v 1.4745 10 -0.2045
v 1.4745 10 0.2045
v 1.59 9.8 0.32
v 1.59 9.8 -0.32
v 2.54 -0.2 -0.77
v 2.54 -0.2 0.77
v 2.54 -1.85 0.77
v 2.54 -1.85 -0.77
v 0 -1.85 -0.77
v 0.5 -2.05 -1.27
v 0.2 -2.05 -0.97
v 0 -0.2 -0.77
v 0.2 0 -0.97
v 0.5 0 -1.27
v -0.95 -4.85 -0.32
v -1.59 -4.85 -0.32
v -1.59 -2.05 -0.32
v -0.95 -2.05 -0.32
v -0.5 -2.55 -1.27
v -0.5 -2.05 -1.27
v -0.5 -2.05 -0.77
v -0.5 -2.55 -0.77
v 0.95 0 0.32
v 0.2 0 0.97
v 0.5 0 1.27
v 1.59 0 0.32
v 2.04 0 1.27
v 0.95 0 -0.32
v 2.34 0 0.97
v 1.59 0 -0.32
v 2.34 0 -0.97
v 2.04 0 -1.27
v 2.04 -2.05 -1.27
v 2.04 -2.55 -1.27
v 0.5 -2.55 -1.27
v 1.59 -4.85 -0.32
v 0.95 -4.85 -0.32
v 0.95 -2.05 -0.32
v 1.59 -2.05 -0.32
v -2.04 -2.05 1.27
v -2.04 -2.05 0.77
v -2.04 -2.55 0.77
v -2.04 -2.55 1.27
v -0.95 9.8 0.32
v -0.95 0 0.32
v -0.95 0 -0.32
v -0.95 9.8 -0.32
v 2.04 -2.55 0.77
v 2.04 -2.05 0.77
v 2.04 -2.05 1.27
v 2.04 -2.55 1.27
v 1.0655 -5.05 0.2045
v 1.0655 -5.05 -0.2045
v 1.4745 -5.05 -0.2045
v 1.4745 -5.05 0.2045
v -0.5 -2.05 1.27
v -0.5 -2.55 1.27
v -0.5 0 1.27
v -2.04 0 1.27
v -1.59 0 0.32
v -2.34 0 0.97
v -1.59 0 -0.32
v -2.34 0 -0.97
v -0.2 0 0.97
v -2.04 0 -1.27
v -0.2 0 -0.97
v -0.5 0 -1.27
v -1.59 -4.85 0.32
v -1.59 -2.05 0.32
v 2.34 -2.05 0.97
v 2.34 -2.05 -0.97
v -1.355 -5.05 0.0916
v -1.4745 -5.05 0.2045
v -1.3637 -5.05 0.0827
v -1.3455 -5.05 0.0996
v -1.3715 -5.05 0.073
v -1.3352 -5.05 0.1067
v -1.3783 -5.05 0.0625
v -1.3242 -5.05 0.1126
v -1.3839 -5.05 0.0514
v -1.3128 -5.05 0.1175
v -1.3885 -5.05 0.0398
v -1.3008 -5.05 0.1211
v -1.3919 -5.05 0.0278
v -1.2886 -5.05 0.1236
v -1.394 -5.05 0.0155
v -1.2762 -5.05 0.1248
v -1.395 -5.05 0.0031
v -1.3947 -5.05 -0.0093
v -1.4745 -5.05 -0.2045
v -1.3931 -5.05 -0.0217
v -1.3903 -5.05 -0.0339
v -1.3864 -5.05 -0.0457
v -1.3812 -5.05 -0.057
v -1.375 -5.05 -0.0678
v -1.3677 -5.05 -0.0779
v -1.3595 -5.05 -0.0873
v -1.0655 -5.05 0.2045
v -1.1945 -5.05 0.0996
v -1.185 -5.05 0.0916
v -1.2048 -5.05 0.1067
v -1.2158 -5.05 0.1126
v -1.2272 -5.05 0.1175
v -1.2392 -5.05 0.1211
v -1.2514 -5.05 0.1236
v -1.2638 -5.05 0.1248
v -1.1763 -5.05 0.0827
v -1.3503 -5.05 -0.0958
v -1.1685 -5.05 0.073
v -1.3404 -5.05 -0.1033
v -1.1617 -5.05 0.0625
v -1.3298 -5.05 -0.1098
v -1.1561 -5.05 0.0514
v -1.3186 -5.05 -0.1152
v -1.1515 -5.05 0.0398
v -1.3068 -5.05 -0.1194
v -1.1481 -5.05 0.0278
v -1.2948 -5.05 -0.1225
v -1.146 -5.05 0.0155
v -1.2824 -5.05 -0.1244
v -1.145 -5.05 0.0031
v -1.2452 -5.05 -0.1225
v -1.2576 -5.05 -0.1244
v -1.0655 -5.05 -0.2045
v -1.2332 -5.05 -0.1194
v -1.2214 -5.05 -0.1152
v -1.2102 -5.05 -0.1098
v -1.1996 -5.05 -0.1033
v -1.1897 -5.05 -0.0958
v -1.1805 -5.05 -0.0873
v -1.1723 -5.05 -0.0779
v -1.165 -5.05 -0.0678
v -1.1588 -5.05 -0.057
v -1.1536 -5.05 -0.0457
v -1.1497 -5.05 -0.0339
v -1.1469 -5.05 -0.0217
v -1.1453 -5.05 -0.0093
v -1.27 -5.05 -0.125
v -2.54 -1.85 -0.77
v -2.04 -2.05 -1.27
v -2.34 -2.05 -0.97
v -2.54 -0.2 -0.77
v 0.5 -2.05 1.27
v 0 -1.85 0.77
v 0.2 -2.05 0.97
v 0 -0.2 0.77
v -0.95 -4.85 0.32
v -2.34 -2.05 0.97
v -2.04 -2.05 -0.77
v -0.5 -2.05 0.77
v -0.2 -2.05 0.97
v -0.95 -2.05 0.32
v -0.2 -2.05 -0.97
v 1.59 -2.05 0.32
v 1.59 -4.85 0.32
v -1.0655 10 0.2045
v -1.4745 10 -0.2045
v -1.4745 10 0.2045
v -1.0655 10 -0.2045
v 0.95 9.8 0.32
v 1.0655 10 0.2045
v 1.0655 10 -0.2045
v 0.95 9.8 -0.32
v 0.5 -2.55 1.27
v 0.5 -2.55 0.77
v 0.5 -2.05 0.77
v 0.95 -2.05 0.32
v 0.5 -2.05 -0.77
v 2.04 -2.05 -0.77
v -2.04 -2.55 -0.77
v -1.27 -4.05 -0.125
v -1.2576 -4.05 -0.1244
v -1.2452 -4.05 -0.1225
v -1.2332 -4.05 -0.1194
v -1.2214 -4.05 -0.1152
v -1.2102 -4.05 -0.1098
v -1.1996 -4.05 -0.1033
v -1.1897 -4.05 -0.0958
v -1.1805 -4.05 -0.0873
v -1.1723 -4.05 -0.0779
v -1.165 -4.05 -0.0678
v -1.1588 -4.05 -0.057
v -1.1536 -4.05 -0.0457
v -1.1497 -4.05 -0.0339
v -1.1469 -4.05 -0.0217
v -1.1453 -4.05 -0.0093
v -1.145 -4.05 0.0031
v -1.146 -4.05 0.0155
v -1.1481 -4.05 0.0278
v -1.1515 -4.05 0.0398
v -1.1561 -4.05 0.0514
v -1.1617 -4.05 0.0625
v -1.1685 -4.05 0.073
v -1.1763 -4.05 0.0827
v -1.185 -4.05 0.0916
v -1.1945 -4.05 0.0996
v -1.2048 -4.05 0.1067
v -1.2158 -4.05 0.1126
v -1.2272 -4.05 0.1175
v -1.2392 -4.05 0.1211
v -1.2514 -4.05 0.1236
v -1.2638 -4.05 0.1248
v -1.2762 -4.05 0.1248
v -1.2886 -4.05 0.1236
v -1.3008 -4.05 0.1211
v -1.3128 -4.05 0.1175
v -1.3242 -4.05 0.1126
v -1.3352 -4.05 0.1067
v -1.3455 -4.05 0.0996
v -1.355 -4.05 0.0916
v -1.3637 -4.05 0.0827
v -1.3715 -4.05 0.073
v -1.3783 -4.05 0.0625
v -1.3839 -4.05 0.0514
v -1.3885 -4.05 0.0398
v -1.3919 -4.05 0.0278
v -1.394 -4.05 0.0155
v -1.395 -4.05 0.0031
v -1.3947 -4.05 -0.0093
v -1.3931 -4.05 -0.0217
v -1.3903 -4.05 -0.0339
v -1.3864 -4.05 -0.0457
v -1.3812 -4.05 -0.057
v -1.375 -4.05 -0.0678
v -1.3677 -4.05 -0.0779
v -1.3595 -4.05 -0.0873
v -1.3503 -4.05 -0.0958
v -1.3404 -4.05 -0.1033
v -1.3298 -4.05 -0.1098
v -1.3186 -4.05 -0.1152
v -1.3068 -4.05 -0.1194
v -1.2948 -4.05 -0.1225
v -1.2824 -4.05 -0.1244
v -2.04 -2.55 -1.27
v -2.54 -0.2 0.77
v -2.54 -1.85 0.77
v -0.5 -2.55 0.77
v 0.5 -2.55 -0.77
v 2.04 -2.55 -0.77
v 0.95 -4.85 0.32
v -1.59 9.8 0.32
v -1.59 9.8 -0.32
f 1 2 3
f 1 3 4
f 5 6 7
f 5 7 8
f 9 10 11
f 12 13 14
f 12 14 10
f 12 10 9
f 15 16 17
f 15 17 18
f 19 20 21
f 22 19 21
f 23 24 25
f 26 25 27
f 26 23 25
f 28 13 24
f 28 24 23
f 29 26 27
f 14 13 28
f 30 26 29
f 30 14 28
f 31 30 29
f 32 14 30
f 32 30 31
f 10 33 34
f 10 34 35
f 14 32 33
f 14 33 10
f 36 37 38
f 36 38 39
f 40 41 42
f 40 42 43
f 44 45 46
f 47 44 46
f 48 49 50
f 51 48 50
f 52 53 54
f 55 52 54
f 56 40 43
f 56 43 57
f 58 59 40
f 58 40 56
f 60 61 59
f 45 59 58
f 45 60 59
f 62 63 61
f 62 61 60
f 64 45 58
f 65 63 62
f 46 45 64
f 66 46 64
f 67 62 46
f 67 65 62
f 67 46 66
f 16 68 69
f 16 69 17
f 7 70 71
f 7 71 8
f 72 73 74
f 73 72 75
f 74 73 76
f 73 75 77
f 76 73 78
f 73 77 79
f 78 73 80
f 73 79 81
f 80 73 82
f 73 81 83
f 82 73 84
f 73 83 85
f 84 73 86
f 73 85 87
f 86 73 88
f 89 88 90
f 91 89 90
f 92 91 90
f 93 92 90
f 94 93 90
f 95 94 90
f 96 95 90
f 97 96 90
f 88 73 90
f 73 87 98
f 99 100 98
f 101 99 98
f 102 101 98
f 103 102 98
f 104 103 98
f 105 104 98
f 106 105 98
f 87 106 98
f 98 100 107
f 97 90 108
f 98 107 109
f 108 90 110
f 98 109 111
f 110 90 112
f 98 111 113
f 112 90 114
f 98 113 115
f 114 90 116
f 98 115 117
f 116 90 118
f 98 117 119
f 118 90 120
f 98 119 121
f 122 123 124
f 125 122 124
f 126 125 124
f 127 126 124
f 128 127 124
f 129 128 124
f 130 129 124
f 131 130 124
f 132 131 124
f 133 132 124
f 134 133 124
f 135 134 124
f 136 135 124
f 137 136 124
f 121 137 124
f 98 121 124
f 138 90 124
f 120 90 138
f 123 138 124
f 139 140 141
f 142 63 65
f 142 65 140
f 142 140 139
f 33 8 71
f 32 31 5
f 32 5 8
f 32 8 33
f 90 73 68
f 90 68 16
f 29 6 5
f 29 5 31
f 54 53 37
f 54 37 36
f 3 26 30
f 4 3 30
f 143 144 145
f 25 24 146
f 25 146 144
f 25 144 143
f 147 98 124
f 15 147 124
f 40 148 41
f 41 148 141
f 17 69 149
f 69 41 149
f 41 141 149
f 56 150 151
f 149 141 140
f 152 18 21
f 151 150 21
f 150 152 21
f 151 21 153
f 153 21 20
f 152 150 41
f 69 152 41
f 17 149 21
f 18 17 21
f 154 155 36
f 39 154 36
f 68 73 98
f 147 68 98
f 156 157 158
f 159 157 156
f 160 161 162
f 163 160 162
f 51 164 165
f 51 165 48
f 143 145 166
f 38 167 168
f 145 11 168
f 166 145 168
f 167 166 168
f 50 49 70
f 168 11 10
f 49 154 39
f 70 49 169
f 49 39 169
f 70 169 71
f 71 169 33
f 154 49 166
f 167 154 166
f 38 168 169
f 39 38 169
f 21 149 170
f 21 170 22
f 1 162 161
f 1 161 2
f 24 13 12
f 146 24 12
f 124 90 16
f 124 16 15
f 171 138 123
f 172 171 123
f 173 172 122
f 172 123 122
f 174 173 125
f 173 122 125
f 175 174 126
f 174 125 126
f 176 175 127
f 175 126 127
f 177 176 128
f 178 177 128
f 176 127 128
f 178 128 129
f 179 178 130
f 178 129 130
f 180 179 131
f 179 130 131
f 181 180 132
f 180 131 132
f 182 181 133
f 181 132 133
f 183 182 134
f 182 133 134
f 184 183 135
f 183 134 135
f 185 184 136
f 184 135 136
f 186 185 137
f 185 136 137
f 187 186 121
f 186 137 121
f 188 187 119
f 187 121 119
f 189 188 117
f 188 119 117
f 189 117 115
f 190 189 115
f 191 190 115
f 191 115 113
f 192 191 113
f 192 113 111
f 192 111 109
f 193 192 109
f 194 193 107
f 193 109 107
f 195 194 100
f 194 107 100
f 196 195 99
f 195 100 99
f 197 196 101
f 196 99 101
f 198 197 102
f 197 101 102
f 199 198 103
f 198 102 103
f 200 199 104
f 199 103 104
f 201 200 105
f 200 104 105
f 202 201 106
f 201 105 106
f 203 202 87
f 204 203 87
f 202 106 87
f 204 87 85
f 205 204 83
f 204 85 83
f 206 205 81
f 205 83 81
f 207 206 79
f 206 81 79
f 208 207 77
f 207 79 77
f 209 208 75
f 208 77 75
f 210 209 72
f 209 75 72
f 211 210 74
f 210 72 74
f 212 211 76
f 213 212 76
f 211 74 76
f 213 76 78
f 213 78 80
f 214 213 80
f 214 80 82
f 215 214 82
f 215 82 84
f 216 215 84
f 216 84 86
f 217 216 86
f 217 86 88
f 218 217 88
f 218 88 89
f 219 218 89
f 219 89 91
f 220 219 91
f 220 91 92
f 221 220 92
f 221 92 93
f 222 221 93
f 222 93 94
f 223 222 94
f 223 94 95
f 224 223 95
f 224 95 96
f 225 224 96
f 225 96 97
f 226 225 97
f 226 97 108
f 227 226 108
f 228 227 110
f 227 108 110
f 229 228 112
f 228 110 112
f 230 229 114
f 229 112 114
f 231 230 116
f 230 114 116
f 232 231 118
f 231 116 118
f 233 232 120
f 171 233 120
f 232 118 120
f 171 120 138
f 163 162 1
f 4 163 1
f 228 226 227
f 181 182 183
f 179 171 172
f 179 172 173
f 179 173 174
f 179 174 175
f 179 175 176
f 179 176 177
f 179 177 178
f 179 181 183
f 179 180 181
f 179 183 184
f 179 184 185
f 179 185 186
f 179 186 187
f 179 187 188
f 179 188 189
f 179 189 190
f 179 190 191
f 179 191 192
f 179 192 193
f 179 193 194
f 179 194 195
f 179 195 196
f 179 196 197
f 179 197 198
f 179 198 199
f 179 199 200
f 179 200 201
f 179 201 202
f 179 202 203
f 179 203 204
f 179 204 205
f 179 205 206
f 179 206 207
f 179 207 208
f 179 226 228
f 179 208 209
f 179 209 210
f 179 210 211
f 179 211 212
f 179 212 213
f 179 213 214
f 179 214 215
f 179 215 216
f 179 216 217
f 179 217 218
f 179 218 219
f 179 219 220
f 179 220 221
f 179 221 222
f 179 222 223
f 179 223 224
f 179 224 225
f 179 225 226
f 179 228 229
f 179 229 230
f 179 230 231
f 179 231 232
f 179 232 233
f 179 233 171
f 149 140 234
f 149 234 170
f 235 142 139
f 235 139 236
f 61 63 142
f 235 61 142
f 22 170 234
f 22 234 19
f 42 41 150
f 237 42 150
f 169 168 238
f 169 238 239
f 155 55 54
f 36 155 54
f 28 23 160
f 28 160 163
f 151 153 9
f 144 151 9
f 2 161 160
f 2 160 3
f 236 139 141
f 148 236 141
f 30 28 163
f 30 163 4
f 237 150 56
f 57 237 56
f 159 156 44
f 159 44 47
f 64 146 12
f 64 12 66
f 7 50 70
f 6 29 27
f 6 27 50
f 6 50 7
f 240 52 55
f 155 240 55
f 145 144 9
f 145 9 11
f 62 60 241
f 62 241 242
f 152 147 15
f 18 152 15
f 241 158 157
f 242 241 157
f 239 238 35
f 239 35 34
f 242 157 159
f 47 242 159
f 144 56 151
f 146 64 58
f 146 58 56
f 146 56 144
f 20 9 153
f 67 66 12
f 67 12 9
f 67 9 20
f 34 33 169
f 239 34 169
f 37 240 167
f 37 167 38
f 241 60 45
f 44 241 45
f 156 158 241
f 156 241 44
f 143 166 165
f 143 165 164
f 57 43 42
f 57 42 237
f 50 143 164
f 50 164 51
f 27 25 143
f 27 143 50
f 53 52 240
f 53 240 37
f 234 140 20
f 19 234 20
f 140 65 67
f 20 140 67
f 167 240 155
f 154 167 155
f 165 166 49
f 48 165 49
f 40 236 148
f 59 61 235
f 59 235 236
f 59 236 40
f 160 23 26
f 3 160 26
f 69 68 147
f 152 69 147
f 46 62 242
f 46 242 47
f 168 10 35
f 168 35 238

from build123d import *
from OCP.BRepFilletAPI import BRepFilletAPI_MakeChamfer

# Parameters (mm, degrees)
SKETCH1_W                = 0.64
SKETCH1_H                = 0.64
BOSS_EXTRUDE1_DEPTH      = 2.05
CUT_EXTRUDE1_DEPTH       = 5
SKETCH3_W                = 1.54
SKETCH3_H                = 0.5
BOSS_EXTRUDE2_DEPTH      = 0.5
BOSS_EXTRUDE3_DEPTH      = 10
BOSS_EXTRUDE3_DEPTH_BACK = 5.05
SKETCH4_W                = 0.64
SKETCH4_H                = 0.64
CHAMFER1_SIZE            = 0.2
CHAMFER1_SIZE2           = 0.115470054
SKETCH5_R                = 0.125
CUT_EXTRUDE2_DEPTH       = 1


with BuildPart() as part:
    # Sketch1 → Boss-Extrude1 (new body)
    with BuildSketch(Plane(origin=(0, 0, 0), x_dir=(1, 0, 0), z_dir=(0, 1, 0))):
        Polygon((-2.04, -1.27), (-0.5, -1.27), (0, -0.77), (0.5, -1.27), (2.04, -1.27), (2.54, -0.77), (2.54, 0.77), (2.04, 1.27), (0.5, 1.27), (0, 0.77), (-0.5, 1.27), (-2.04, 1.27), (-2.54, 0.77), (-2.54, -0.77), align=None)
        with Locations((1.27, 0)):
            Rectangle(SKETCH1_W, SKETCH1_H, mode=Mode.SUBTRACT)
        with Locations((-1.27, 0)):
            Rectangle(SKETCH1_W, SKETCH1_H, mode=Mode.SUBTRACT)
    extrude(amount=-BOSS_EXTRUDE1_DEPTH)

    # Sketch2 → Cut-Extrude1 (cut, symmetric)
    with BuildSketch(Plane.XY):
        Polygon((-2.54, -0.2), (-2.54, 0), (-2.34, 0), align=None)
        Polygon((-0.2, 0), (0.2, 0), (0, -0.2), align=None)
        Polygon((2.34, 0), (2.54, 0), (2.54, -0.2), align=None)
        Polygon((-2.54, -1.85), (-2.34, -2.05), (-2.54, -2.05), align=None)
        Polygon((-0.2, -2.05), (0, -1.85), (0.2, -2.05), align=None)
        Polygon((2.34, -2.05), (2.54, -1.85), (2.54, -2.05), align=None)
    extrude(amount=CUT_EXTRUDE1_DEPTH, both=True, mode=Mode.SUBTRACT)

    # Sketch3 → Boss-Extrude2 (add)
    with BuildSketch(Plane.XZ.offset(2.05)):
        with Locations((-1.27, -1.02)):
            Rectangle(SKETCH3_W, SKETCH3_H)
        with Locations((-1.27, 1.02)):
            Rectangle(SKETCH3_W, SKETCH3_H)
        with Locations((1.27, 1.02)):
            Rectangle(SKETCH3_W, SKETCH3_H)
        with Locations((1.27, -1.02)):
            Rectangle(SKETCH3_W, SKETCH3_H)
    extrude(amount=BOSS_EXTRUDE2_DEPTH)

    # Sketch4 → Boss-Extrude3 (add, two sides: drawn at the far end of the back side and taken through both)
    with BuildSketch(Plane(origin=(0, 0, 0), x_dir=(1, 0, 0), z_dir=(0, 1, 0)).offset(-BOSS_EXTRUDE3_DEPTH_BACK)):
        with Locations((-1.27, 0)):
            Rectangle(SKETCH4_W, SKETCH4_H)
        with Locations((1.27, 0)):
            Rectangle(SKETCH4_W, SKETCH4_H)
    extrude(amount=BOSS_EXTRUDE3_DEPTH + BOSS_EXTRUDE3_DEPTH_BACK)

    # Chamfer1: one chamfer whose edges measure the first distance from different faces: ONE call of the kernel's chamfer builder (chamfer() names one face for all edges)
    chamfer1_edges_1 = [part.edges().sort_by_distance(p)[0] for p in [
        (-1.59, -5.05, 0),
    ]]
    chamfer1_side_1 = [part.faces().sort_by_distance(p)[0] for p in [
        (-1.59, -3.55, 0),
    ]]
    chamfer1_edges_2 = [part.edges().sort_by_distance(p)[0] for p in [
        (-1.27, -5.05, -0.32),
    ]]
    chamfer1_side_2 = [part.faces().sort_by_distance(p)[0] for p in [
        (-1.27, -3.55, -0.32),
    ]]
    chamfer1_edges_3 = [part.edges().sort_by_distance(p)[0] for p in [
        (-0.95, -5.05, 0),
    ]]
    chamfer1_side_3 = [part.faces().sort_by_distance(p)[0] for p in [
        (-0.95, -3.55, 0),
    ]]
    chamfer1_edges_4 = [part.edges().sort_by_distance(p)[0] for p in [
        (-1.27, -5.05, 0.32),
    ]]
    chamfer1_side_4 = [part.faces().sort_by_distance(p)[0] for p in [
        (-1.27, -3.55, 0.32),
    ]]
    chamfer1_edges_5 = [part.edges().sort_by_distance(p)[0] for p in [
        (-1.59, 10, 0),
    ]]
    chamfer1_side_5 = [part.faces().sort_by_distance(p)[0] for p in [
        (-1.59, 5, 0),
    ]]
    chamfer1_edges_6 = [part.edges().sort_by_distance(p)[0] for p in [
        (-1.27, 10, 0.32),
    ]]
    chamfer1_side_6 = [part.faces().sort_by_distance(p)[0] for p in [
        (-1.27, 5, 0.32),
    ]]
    chamfer1_edges_7 = [part.edges().sort_by_distance(p)[0] for p in [
        (-0.95, 10, 0),
    ]]
    chamfer1_side_7 = [part.faces().sort_by_distance(p)[0] for p in [
        (-0.95, 5, 0),
    ]]
    chamfer1_edges_8 = [part.edges().sort_by_distance(p)[0] for p in [
        (-1.27, 10, -0.32),
    ]]
    chamfer1_side_8 = [part.faces().sort_by_distance(p)[0] for p in [
        (-1.27, 5, -0.32),
    ]]
    chamfer1_edges_9 = [part.edges().sort_by_distance(p)[0] for p in [
        (0.95, -5.05, 0),
    ]]
    chamfer1_side_9 = [part.faces().sort_by_distance(p)[0] for p in [
        (0.95, -3.55, 0),
    ]]
    chamfer1_edges_10 = [part.edges().sort_by_distance(p)[0] for p in [
        (1.27, -5.05, -0.32),
    ]]
    chamfer1_side_10 = [part.faces().sort_by_distance(p)[0] for p in [
        (1.27, -3.55, -0.32),
    ]]
    chamfer1_edges_11 = [part.edges().sort_by_distance(p)[0] for p in [
        (1.59, -5.05, 0),
    ]]
    chamfer1_side_11 = [part.faces().sort_by_distance(p)[0] for p in [
        (1.59, -3.55, 0),
    ]]
    chamfer1_edges_12 = [part.edges().sort_by_distance(p)[0] for p in [
        (1.27, -5.05, 0.32),
    ]]
    chamfer1_side_12 = [part.faces().sort_by_distance(p)[0] for p in [
        (1.27, -3.55, 0.32),
    ]]
    chamfer1_edges_13 = [part.edges().sort_by_distance(p)[0] for p in [
        (0.95, 10, 0),
    ]]
    chamfer1_side_13 = [part.faces().sort_by_distance(p)[0] for p in [
        (0.95, 5, 0),
    ]]
    chamfer1_edges_14 = [part.edges().sort_by_distance(p)[0] for p in [
        (1.27, 10, 0.32),
    ]]
    chamfer1_side_14 = [part.faces().sort_by_distance(p)[0] for p in [
        (1.27, 5, 0.32),
    ]]
    chamfer1_edges_15 = [part.edges().sort_by_distance(p)[0] for p in [
        (1.59, 10, 0),
    ]]
    chamfer1_side_15 = [part.faces().sort_by_distance(p)[0] for p in [
        (1.59, 5, 0),
    ]]
    chamfer1_edges_16 = [part.edges().sort_by_distance(p)[0] for p in [
        (1.27, 10, -0.32),
    ]]
    chamfer1_side_16 = [part.faces().sort_by_distance(p)[0] for p in [
        (1.27, 5, -0.32),
    ]]
    chamfer1 = BRepFilletAPI_MakeChamfer(part.part.solid().wrapped)
    for e in chamfer1_edges_1:
        chamfer1.Add(CHAMFER1_SIZE, CHAMFER1_SIZE2, e.wrapped, chamfer1_side_1[0].wrapped)  # the first distance lies on this face
    for e in chamfer1_edges_2:
        chamfer1.Add(CHAMFER1_SIZE, CHAMFER1_SIZE2, e.wrapped, chamfer1_side_2[0].wrapped)  # the first distance lies on this face
    for e in chamfer1_edges_3:
        chamfer1.Add(CHAMFER1_SIZE, CHAMFER1_SIZE2, e.wrapped, chamfer1_side_3[0].wrapped)  # the first distance lies on this face
    for e in chamfer1_edges_4:
        chamfer1.Add(CHAMFER1_SIZE, CHAMFER1_SIZE2, e.wrapped, chamfer1_side_4[0].wrapped)  # the first distance lies on this face
    for e in chamfer1_edges_5:
        chamfer1.Add(CHAMFER1_SIZE, CHAMFER1_SIZE2, e.wrapped, chamfer1_side_5[0].wrapped)  # the first distance lies on this face
    for e in chamfer1_edges_6:
        chamfer1.Add(CHAMFER1_SIZE, CHAMFER1_SIZE2, e.wrapped, chamfer1_side_6[0].wrapped)  # the first distance lies on this face
    for e in chamfer1_edges_7:
        chamfer1.Add(CHAMFER1_SIZE, CHAMFER1_SIZE2, e.wrapped, chamfer1_side_7[0].wrapped)  # the first distance lies on this face
    for e in chamfer1_edges_8:
        chamfer1.Add(CHAMFER1_SIZE, CHAMFER1_SIZE2, e.wrapped, chamfer1_side_8[0].wrapped)  # the first distance lies on this face
    for e in chamfer1_edges_9:
        chamfer1.Add(CHAMFER1_SIZE, CHAMFER1_SIZE2, e.wrapped, chamfer1_side_9[0].wrapped)  # the first distance lies on this face
    for e in chamfer1_edges_10:
        chamfer1.Add(CHAMFER1_SIZE, CHAMFER1_SIZE2, e.wrapped, chamfer1_side_10[0].wrapped)  # the first distance lies on this face
    for e in chamfer1_edges_11:
        chamfer1.Add(CHAMFER1_SIZE, CHAMFER1_SIZE2, e.wrapped, chamfer1_side_11[0].wrapped)  # the first distance lies on this face
    for e in chamfer1_edges_12:
        chamfer1.Add(CHAMFER1_SIZE, CHAMFER1_SIZE2, e.wrapped, chamfer1_side_12[0].wrapped)  # the first distance lies on this face
    for e in chamfer1_edges_13:
        chamfer1.Add(CHAMFER1_SIZE, CHAMFER1_SIZE2, e.wrapped, chamfer1_side_13[0].wrapped)  # the first distance lies on this face
    for e in chamfer1_edges_14:
        chamfer1.Add(CHAMFER1_SIZE, CHAMFER1_SIZE2, e.wrapped, chamfer1_side_14[0].wrapped)  # the first distance lies on this face
    for e in chamfer1_edges_15:
        chamfer1.Add(CHAMFER1_SIZE, CHAMFER1_SIZE2, e.wrapped, chamfer1_side_15[0].wrapped)  # the first distance lies on this face
    for e in chamfer1_edges_16:
        chamfer1.Add(CHAMFER1_SIZE, CHAMFER1_SIZE2, e.wrapped, chamfer1_side_16[0].wrapped)  # the first distance lies on this face
    add(Compound.cast(chamfer1.Shape()), mode=Mode.REPLACE)

    # Sketch5 → Cut-Extrude2 (cut)
    with BuildSketch(Plane.XZ.offset(5.05)):
        with Locations(Location((-1.27, 0, 0), (0, 0, 270))):
            Circle(SKETCH5_R)
    extrude(amount=-CUT_EXTRUDE2_DEPTH, mode=Mode.SUBTRACT)


solid = part.part
